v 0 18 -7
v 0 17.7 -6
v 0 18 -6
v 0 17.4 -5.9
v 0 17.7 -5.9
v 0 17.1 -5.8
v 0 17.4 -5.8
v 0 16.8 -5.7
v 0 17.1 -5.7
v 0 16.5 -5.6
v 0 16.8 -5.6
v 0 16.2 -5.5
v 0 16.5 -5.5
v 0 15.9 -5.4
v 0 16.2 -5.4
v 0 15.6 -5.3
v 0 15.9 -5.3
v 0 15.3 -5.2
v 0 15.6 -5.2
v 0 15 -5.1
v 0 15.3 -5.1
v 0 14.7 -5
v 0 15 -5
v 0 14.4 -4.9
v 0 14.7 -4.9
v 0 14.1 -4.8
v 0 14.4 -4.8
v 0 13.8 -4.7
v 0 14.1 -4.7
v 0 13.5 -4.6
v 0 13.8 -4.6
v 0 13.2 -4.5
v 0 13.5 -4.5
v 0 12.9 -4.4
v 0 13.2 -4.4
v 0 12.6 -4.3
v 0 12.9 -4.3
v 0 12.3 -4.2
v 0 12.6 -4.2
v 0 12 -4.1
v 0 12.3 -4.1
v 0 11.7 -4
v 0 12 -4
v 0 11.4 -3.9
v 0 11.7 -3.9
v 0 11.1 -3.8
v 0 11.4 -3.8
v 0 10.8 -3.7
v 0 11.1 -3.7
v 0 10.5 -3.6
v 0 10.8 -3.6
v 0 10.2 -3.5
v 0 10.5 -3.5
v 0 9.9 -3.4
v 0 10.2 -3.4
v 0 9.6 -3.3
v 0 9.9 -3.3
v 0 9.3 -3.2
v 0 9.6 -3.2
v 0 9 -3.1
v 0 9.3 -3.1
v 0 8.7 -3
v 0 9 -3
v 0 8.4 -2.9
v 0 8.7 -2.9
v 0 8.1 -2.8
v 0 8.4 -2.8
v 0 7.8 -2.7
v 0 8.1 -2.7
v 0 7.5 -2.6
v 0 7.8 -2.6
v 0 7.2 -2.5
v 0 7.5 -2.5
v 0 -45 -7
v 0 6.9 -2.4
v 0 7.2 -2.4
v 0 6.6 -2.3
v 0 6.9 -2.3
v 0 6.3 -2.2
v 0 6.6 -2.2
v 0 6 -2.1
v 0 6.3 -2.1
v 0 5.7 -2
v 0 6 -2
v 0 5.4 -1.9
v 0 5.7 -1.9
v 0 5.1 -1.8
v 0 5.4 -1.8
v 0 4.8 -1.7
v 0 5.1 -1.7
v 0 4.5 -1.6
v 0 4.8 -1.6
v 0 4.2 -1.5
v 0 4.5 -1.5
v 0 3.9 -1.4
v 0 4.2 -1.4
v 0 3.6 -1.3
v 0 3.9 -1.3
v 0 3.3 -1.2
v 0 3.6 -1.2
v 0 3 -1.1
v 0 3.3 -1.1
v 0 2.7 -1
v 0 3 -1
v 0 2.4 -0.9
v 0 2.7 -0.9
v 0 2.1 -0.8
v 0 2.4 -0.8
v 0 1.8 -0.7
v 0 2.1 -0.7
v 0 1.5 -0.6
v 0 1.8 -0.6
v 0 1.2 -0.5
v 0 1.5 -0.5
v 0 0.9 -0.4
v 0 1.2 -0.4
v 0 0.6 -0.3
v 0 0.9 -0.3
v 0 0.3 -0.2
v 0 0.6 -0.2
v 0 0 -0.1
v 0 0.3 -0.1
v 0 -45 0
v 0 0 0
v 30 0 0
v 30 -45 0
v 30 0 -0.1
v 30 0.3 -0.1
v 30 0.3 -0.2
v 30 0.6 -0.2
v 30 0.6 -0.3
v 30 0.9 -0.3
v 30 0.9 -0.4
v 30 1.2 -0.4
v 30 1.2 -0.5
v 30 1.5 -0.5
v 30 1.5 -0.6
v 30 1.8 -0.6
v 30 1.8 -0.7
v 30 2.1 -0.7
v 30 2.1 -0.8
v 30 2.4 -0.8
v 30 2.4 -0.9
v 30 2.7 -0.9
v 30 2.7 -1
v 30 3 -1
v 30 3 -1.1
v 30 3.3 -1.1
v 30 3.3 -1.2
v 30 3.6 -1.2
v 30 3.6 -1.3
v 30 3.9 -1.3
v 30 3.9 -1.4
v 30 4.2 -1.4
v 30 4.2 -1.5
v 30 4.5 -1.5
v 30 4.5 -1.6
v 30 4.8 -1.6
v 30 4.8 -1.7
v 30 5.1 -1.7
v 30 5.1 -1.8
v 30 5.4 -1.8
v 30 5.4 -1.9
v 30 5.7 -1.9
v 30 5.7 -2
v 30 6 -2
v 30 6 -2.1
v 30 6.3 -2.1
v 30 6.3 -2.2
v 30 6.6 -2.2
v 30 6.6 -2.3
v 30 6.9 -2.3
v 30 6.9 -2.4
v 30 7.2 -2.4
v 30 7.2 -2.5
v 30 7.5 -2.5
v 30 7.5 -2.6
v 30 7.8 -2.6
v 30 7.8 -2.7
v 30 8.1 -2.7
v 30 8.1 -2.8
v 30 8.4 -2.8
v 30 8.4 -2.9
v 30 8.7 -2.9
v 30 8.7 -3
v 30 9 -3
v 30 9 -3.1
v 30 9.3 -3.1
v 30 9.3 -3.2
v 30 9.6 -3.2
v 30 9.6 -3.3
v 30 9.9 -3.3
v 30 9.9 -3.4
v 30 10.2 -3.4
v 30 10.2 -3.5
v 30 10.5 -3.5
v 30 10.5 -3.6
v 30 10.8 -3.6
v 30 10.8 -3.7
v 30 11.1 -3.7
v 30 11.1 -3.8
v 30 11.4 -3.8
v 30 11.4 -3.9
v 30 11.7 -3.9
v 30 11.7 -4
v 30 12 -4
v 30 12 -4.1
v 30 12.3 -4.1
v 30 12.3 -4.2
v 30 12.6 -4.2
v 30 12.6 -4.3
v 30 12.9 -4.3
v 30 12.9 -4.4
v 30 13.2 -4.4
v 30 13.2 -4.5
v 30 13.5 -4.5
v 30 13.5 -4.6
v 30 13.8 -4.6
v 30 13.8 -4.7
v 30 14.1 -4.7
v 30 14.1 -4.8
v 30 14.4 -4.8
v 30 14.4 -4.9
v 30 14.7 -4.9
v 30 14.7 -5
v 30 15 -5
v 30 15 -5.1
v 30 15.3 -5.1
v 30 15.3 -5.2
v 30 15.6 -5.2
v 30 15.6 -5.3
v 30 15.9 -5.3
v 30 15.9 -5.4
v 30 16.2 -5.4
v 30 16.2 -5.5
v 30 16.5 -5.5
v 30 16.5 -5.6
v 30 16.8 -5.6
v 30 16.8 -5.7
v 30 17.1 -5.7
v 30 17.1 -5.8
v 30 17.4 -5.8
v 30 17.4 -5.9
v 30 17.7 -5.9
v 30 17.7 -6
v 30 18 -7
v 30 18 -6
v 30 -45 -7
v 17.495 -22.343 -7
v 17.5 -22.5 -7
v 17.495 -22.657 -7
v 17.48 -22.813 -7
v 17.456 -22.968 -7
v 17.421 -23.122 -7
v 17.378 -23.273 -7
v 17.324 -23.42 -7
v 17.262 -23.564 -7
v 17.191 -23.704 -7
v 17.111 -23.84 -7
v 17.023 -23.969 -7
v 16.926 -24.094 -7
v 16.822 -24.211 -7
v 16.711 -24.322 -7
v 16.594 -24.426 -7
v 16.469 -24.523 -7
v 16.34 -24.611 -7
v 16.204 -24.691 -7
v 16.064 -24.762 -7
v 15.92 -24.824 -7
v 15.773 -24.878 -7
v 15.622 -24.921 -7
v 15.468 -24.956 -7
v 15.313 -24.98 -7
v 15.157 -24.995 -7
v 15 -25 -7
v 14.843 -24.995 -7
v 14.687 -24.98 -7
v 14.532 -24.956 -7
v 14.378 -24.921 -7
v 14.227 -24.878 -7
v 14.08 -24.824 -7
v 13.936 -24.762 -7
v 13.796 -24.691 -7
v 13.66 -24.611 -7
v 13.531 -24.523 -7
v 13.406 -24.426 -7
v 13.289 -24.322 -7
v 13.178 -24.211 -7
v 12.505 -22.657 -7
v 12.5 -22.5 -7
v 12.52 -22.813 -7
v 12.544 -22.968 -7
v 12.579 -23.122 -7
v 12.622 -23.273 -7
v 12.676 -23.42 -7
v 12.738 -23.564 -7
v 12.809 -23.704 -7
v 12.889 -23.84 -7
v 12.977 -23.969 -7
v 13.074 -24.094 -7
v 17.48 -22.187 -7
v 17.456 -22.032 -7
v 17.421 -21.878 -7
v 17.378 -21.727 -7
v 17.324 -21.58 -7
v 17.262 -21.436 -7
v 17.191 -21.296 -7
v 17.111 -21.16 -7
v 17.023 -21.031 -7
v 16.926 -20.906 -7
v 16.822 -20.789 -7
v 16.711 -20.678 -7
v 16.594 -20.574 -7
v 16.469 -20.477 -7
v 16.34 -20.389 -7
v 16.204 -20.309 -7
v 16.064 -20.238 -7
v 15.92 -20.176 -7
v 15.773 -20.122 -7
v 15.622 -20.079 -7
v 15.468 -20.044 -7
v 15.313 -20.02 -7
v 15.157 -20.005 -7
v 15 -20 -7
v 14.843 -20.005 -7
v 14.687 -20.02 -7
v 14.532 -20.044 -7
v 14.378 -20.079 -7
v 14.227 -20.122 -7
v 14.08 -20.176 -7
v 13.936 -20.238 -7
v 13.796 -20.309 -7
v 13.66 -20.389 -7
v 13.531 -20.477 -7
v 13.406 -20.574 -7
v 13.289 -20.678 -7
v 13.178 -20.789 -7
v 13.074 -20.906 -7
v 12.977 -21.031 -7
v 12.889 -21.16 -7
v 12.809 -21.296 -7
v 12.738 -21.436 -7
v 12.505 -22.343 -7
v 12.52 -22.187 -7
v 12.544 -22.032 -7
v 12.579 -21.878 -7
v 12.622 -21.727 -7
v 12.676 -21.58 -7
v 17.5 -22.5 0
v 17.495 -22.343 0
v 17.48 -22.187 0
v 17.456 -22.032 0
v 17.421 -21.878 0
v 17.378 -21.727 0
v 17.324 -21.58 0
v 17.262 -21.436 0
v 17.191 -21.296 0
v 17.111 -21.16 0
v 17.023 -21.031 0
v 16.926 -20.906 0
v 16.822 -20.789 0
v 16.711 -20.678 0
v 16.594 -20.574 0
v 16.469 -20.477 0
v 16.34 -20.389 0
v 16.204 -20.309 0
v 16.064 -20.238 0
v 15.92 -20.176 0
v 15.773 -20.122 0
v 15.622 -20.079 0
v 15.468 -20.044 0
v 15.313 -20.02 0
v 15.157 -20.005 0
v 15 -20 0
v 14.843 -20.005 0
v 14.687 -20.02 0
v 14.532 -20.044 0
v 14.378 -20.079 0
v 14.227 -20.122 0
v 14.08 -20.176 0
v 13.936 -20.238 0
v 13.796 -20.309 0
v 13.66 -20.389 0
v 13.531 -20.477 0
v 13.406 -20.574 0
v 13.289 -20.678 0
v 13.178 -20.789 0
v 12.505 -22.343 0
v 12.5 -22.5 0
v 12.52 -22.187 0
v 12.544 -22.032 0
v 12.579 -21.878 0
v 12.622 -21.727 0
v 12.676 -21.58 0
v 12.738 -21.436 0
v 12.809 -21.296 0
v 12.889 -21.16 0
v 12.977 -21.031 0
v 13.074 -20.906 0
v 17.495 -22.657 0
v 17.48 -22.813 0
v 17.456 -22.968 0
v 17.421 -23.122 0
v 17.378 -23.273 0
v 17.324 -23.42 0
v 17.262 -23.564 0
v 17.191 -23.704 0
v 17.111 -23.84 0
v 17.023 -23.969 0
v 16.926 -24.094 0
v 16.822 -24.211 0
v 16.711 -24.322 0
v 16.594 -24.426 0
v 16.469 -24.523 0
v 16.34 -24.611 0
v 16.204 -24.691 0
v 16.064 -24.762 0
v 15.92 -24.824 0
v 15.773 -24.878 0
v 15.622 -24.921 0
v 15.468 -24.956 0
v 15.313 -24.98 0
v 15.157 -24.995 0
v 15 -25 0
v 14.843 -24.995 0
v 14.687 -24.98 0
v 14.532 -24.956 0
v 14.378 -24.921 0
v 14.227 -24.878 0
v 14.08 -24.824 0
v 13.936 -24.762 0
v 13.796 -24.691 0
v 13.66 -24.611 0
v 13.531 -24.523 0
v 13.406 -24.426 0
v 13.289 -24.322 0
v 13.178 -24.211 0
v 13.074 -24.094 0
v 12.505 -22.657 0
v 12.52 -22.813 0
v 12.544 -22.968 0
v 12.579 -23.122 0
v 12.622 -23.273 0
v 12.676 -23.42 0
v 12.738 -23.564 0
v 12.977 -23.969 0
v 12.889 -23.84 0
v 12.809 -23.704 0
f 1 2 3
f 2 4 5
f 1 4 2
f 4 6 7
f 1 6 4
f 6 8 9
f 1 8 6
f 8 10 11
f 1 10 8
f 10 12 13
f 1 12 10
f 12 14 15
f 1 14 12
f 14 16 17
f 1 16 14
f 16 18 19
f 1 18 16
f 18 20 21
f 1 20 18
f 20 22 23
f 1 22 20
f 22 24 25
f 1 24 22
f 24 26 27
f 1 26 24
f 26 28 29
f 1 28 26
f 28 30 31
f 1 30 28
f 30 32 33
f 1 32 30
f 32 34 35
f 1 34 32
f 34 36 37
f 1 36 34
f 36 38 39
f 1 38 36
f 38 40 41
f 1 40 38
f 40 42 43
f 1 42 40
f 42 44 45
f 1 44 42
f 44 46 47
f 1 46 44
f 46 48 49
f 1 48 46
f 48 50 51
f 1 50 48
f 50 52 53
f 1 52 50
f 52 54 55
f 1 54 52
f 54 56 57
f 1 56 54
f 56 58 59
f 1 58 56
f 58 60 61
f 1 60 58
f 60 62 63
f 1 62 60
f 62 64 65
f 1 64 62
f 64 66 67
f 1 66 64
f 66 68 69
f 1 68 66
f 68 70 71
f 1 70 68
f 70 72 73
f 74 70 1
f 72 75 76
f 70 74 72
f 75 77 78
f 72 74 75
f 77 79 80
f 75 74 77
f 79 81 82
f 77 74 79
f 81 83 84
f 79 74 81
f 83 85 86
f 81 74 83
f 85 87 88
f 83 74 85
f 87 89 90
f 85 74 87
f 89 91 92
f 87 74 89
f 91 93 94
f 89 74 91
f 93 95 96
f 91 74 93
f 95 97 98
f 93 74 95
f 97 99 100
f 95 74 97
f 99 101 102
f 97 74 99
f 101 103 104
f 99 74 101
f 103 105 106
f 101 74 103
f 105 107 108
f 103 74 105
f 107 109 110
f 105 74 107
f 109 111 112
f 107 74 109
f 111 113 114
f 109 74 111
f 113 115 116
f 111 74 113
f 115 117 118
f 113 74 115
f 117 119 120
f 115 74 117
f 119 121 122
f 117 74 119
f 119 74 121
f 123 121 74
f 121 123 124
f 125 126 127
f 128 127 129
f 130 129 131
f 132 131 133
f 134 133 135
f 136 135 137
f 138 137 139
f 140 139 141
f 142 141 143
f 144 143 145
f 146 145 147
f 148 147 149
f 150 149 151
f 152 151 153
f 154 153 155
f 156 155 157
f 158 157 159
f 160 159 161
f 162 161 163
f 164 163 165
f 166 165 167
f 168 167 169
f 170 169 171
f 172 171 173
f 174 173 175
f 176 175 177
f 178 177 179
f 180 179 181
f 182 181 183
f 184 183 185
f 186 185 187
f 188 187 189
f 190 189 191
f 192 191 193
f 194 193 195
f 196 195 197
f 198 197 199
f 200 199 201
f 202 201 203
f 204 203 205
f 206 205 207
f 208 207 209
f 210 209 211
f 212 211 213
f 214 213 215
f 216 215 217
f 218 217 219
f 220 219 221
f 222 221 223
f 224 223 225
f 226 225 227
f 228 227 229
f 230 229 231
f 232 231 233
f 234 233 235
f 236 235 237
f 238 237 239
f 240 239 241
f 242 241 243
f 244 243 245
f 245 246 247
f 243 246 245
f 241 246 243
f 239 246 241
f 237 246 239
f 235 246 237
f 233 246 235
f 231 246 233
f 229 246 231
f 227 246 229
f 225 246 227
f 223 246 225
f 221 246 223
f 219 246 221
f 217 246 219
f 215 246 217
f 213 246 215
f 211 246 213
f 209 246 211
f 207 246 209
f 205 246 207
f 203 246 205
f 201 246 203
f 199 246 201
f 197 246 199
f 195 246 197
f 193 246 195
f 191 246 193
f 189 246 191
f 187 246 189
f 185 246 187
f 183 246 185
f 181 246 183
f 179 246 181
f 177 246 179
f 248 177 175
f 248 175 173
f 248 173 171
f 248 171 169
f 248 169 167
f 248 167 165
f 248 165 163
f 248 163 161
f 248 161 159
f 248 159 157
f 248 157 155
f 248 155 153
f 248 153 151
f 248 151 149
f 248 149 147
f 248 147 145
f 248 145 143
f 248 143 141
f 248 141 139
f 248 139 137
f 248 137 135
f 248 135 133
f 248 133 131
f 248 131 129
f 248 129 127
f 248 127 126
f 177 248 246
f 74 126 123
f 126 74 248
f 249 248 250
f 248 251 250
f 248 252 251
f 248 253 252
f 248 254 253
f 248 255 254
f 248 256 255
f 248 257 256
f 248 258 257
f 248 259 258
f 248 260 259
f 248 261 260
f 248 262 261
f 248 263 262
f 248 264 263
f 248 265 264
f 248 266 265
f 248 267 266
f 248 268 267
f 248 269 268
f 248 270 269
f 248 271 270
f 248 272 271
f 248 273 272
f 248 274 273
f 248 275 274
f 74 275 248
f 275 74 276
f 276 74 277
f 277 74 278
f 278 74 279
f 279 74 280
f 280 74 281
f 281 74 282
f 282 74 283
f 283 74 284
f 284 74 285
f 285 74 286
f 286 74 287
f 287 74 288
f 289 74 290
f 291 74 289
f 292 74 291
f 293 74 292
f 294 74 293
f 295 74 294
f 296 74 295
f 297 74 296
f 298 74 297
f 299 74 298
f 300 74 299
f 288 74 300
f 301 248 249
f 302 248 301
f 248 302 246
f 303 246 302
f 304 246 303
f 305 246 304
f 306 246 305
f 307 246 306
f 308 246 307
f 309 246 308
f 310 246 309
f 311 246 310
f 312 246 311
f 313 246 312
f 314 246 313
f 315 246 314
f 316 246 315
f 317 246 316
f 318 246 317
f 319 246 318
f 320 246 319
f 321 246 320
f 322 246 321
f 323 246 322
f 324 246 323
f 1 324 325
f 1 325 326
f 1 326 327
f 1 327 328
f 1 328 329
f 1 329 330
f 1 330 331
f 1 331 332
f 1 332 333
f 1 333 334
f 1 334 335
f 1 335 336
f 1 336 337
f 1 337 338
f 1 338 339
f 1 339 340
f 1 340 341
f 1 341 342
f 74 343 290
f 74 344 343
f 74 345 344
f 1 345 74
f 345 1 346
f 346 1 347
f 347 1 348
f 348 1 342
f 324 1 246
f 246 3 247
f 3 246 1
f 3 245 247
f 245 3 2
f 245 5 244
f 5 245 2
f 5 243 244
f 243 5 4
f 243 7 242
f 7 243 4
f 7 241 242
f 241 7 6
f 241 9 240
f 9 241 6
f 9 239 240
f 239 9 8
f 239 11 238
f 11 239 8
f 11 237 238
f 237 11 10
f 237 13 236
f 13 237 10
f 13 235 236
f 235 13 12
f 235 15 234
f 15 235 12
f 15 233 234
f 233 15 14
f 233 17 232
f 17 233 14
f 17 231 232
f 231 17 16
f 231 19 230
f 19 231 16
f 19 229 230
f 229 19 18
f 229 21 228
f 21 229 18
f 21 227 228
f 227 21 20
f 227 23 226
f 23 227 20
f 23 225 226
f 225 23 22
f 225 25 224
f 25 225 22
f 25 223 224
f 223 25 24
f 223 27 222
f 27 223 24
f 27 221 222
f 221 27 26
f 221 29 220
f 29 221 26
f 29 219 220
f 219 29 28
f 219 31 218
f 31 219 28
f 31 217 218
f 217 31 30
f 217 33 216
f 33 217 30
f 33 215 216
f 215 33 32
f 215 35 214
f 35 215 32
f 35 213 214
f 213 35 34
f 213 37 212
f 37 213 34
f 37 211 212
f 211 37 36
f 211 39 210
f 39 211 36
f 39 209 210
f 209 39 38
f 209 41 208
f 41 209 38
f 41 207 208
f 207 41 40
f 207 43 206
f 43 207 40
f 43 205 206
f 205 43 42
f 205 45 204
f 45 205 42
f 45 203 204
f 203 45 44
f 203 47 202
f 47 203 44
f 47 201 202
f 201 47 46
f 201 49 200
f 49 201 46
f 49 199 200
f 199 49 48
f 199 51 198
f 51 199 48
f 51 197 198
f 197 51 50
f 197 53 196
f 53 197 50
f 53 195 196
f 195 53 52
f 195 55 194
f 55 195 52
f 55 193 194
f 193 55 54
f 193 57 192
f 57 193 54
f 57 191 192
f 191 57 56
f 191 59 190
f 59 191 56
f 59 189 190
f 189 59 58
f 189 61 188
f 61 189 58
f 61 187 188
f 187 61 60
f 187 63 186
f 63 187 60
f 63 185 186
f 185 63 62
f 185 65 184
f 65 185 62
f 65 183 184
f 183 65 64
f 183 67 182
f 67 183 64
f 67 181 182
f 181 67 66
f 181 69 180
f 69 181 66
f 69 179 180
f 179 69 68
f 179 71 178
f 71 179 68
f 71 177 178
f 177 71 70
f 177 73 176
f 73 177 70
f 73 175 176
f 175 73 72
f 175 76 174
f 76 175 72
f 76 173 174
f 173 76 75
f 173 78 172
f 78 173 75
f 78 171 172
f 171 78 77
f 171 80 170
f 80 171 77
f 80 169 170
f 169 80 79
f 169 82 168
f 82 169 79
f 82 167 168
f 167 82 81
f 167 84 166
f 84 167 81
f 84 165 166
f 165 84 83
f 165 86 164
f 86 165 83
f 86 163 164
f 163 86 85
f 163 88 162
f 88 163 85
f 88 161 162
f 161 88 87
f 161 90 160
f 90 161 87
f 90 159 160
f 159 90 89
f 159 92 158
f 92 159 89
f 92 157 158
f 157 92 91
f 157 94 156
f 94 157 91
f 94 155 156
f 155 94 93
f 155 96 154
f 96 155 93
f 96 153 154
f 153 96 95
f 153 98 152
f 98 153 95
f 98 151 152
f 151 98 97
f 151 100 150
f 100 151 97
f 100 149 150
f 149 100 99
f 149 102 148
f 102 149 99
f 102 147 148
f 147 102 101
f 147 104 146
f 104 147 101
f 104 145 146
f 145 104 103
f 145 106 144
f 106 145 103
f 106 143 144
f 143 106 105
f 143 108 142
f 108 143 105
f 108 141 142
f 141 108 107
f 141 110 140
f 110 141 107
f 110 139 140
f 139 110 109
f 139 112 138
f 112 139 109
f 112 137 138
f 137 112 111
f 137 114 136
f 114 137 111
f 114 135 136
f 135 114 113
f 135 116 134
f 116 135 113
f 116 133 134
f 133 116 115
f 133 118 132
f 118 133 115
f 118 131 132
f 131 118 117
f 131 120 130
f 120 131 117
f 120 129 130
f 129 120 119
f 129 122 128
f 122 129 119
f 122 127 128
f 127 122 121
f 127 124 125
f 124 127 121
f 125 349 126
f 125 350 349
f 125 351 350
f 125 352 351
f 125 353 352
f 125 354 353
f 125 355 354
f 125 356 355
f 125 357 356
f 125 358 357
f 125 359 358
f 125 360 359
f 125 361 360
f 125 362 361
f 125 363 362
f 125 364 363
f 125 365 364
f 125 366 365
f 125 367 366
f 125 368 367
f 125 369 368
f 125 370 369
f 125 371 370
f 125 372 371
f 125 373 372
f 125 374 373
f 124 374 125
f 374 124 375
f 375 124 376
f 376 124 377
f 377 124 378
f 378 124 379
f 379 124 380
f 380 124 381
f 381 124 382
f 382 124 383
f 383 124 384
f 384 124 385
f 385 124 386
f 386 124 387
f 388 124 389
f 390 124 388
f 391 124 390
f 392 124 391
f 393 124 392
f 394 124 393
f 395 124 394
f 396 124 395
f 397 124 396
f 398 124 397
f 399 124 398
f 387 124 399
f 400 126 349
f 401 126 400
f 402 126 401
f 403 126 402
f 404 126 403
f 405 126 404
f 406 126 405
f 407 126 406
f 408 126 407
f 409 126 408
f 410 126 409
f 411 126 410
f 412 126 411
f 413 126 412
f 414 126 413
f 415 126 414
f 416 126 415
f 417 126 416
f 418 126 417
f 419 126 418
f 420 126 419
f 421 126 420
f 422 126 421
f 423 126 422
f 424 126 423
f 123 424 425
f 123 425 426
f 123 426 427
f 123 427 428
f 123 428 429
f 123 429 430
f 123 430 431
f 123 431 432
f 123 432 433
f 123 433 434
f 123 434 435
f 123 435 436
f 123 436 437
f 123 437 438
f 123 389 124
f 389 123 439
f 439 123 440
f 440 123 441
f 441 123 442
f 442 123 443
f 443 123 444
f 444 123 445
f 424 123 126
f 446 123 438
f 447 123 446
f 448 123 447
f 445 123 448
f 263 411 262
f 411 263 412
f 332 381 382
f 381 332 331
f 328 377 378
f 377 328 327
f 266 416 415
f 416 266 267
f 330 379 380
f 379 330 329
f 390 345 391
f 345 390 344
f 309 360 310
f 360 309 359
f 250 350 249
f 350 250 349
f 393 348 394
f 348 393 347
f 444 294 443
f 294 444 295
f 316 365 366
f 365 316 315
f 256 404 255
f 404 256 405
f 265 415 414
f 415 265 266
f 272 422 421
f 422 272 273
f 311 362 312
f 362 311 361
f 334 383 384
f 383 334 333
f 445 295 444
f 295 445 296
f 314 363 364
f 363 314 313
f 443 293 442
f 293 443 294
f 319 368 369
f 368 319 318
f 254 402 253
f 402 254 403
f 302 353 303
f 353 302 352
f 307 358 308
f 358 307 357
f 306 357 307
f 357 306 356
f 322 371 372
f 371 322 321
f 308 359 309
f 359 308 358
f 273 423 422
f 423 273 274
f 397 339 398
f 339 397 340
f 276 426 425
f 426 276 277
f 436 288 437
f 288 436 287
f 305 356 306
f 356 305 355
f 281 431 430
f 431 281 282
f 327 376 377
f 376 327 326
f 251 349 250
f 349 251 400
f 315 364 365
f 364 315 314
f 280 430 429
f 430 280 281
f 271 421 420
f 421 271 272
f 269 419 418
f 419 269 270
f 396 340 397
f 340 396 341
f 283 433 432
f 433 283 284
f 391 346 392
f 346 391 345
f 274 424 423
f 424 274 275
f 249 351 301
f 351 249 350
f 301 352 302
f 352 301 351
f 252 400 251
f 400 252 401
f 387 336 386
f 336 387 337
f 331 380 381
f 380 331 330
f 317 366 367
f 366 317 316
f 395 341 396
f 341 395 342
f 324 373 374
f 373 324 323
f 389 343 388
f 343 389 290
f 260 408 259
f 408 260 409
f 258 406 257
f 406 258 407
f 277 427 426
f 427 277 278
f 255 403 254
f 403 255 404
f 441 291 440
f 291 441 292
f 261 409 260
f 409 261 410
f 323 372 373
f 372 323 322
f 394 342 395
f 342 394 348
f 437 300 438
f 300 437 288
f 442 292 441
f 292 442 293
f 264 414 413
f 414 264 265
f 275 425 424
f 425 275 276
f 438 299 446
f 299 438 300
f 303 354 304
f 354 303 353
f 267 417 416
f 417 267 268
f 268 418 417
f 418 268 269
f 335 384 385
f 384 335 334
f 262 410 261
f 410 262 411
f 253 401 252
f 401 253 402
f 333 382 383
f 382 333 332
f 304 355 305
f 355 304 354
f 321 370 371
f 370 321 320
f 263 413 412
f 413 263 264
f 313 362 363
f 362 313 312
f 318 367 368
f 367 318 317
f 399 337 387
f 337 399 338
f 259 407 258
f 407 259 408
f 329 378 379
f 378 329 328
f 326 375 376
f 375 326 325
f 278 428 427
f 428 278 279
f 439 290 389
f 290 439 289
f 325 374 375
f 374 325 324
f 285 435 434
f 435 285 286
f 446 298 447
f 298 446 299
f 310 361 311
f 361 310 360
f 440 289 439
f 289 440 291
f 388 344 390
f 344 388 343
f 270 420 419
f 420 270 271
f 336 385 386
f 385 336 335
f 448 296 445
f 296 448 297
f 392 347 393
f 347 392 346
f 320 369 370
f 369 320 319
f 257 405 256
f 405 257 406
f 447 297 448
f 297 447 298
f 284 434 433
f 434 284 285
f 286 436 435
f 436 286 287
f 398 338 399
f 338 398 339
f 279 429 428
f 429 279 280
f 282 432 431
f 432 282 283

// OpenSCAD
/*
Description : the J-brace purpose; 
    a) to hold rubber in place.
    b) anchor for trough-spacer.

NOTE: slicer is not slicing wall 1mm thick. removing -3*BRACE_THICKNESS from height,
since first increment will not appear in g-code.
UPDATE: While above is true the shorter thicker model came out better.

Added Flat J-brace for use to do leveling of string attached to the wall.
Also can be used to hold rubber on the wall.
*/

/*****************************************************************************
CONSTANTS
*****************************************************************************/
$fn=100;
PI = 4 * atan2(1,1);

WALL_HEIGHT = 180;
FLOOR_WIDTH = 85;
TRUSS_HEIGHT = 40;
BRACE_WIDTH = 30;
BRACE_THICKNESS = 6;
TRIANGLE = [[0,0],[0,1],[1,0]];

/*****************************************************************************
FUNCTIONS - code to make reading modules easier to understand.
******************************************************************************/
function half(x) = x/2;
function wedgeIncrement(height,i) = i * half(height)/(BRACE_THICKNESS)+half(height);

/*****************************************************************************
Directives - defines what to build with optional features.
*****************************************************************************/
INCLUDE_THING = 0;
BUILD_JBRACE = 0;
BUILD_FLAT_JBRACE = 1;
BUILD_LONG_RULER_STAND = 0;
BUILD_LONG_RULER_VISUAL_MARKER = 0;
BUILD_JBRACE_FLOOR_SPACER = 0;

/*****************************************************************************
MAIN SUB - where the instructions start.
*****************************************************************************/
build();

/*****************************************************************************
MODULES: - the meat of the project.
*****************************************************************************/
module build()
{
    if(BUILD_JBRACE) J_Brace();
    if (BUILD_FLAT_JBRACE) 
    {
        echo("Building flat J-brace");
        echo(FileName = "Flat screw holder.stl");
        // flat J-brace
        difference()
        {
            union()
            {
                rotate([0, 90, 0]) 
                linear_extrude(BRACE_WIDTH)
                {
                    for (i=[0:0.1:BRACE_THICKNESS]) 
                    {
                        // echo(str("wedgeIncrement(i)=", wedgeIncrement(WALL_HEIGHT,i)));
                        translate([i, 0, 0]) 
                        square(size=[1,3 * i], center = false);
                    }        
                    translate([0, -WALL_HEIGHT/4, 0])
                    square(size=[BRACE_THICKNESS+1, WALL_HEIGHT/4], center = false);
                }             
            }      
            //screw hole for spacer.
            translate([half(BRACE_WIDTH), -half(WALL_HEIGHT/4), half(WALL_HEIGHT/4)]) 
            // rotate([90, 0, 0]) 
            cylinder(h = 100,d = 5, $fn=100, center = true);                  
        }

        
    }
    if(BUILD_LONG_RULER_STAND) longRulerStand(20,10,3.5,BRACE_THICKNESS);
    if(BUILD_LONG_RULER_VISUAL_MARKER) longRulerStandVisualMarker(20,10,3.5,BRACE_THICKNESS);
    if(BUILD_JBRACE_FLOOR_SPACER)
        J_BraceFloorSpacer(10, half(FLOOR_WIDTH-BRACE_WIDTH), BRACE_WIDTH, BRACE_THICKNESS);
    
}
module J_BraceFloorSpacer(spacerHeight, spacerWidth, J_BraceWidth, spacerThickness) 
{
    echo(spacerHeight=spacerHeight, spacerWidth=spacerWidth, J_BraceWidth=J_BraceWidth, spacerThickness=spacerThickness);

difference()
    {
        union()
        {
            cube(size=[spacerWidth, spacerWidth, spacerThickness]);

            translate([spacerWidth + J_BraceWidth, 0, 0]) 
            {
                cube(size=[spacerWidth, spacerWidth, spacerThickness]);    
            }

            translate([0,0,-spacerThickness])
            cube(size=[2*spacerWidth + J_BraceWidth, spacerWidth, spacerHeight]);  
        }      

        //screw hole for spacer.
        translate([half(2*spacerWidth + J_BraceWidth), half(spacerWidth), 0]) 
        rotate([0, 0, 0]) 
        cylinder(h = 100,d = 4, $fn=100, center = true);
    }
}

module longRulerStandVisualMarker(braceHeight,braceWidth,rulerWidth,standThickness) {
    difference()
    {
        longRulerStand(braceHeight,braceWidth,rulerWidth,standThickness);

        translate([braceHeight/2 - 6.5,0,0])
        {
            cube([2*braceHeight-rulerWidth,braceHeight+1,11], center=false);
        }
    }

    // rotate([90, 0, 0]) 
    // #cube(size=[(2*braceHeight)+rulerWidth, braceWidth, standThickness]);
}

module longRulerStand(braceHeight,braceWidth,rulerWidth,standThickness)
{
    translate([(braceHeight + rulerWidth), 0, 0]) 
    {
        triangle90(braceHeight,braceHeight,braceWidth);    
    }
    
    translate([braceHeight, 0, 0]) 
    {
        rotate([0,0,90])
        triangle90(braceHeight,braceHeight,braceWidth);    
    }

    // translate([0,0,-half(braceWidth)])
    rotate([90, 0, 0]) 
    cube(size=[(2*braceHeight)+rulerWidth, braceWidth, standThickness]);
}

module J_Brace() {
    
    difference()
    {
        union()
        {
            staggaredWall(height = WALL_HEIGHT-3*BRACE_THICKNESS);
            linear_extrude(BRACE_WIDTH)
            {
                {
                    //floor
                    color("LightCyan")
                    translate([1.8*BRACE_THICKNESS, 0, 0]) 
                    // rotate([0, 0, 5]) 
                    square(size=[(FLOOR_WIDTH-BRACE_THICKNESS),BRACE_THICKNESS]);

                    //truss side
                    color("PaleTurquoise") 
                    translate([FLOOR_WIDTH, 0, 0])     
                    rotate([0, 0, -5]) 
                    {
                        square(size=[BRACE_THICKNESS,TRUSS_HEIGHT]);
                    }
                }
            }

            color("Turquoise") 
            translate([2*BRACE_THICKNESS-0.7, 2*BRACE_THICKNESS, 0]) 
            rotate([0, 0, 180]) 
            rotate_extrude(angle = 90)
            translate([BRACE_THICKNESS, 0, 0]) 
            {
                square(size=[BRACE_THICKNESS, BRACE_WIDTH]);
            }            
        }
        
        //screw hole for spacer.
        translate([half(FLOOR_WIDTH), 0, half(BRACE_WIDTH)]) 
        rotate([90, 0, 0]) 
        cylinder(h = 100,d = 5, $fn=100, center = true);

        //screw hole for truss
        translate([FLOOR_WIDTH, half(TRUSS_HEIGHT), half(BRACE_WIDTH)]) 
        rotate([0, 90, 0]) 
        cylinder(h = 100,d = 5, $fn=100, center = true);
    }
}

module staggaredWall(height=WALL_HEIGHT)
{
    echo(str("height = ", height));
    // translate([BRACE_THICKNESS+0.3, 1.8* BRACE_THICKNESS, BRACE_WIDTH]) 
    // rotate([0, 180, 5]) 
    linear_extrude(BRACE_WIDTH)
    {
        for (i=[1:(BRACE_THICKNESS)]) {
            echo(str("wedgeIncrement(i)=", wedgeIncrement(height,i)));
            translate([i, 0, 0]) 
            square(size=[1,wedgeIncrement(height,i)], center = false);
        }        
    }    
}

module triangle90(width,height,depth) 
{
    linear_extrude(depth)
    scale([width, height, 0]) 
    {
        polygon(points=[[0,0],[1,0],[0,1]]);
    }
}
